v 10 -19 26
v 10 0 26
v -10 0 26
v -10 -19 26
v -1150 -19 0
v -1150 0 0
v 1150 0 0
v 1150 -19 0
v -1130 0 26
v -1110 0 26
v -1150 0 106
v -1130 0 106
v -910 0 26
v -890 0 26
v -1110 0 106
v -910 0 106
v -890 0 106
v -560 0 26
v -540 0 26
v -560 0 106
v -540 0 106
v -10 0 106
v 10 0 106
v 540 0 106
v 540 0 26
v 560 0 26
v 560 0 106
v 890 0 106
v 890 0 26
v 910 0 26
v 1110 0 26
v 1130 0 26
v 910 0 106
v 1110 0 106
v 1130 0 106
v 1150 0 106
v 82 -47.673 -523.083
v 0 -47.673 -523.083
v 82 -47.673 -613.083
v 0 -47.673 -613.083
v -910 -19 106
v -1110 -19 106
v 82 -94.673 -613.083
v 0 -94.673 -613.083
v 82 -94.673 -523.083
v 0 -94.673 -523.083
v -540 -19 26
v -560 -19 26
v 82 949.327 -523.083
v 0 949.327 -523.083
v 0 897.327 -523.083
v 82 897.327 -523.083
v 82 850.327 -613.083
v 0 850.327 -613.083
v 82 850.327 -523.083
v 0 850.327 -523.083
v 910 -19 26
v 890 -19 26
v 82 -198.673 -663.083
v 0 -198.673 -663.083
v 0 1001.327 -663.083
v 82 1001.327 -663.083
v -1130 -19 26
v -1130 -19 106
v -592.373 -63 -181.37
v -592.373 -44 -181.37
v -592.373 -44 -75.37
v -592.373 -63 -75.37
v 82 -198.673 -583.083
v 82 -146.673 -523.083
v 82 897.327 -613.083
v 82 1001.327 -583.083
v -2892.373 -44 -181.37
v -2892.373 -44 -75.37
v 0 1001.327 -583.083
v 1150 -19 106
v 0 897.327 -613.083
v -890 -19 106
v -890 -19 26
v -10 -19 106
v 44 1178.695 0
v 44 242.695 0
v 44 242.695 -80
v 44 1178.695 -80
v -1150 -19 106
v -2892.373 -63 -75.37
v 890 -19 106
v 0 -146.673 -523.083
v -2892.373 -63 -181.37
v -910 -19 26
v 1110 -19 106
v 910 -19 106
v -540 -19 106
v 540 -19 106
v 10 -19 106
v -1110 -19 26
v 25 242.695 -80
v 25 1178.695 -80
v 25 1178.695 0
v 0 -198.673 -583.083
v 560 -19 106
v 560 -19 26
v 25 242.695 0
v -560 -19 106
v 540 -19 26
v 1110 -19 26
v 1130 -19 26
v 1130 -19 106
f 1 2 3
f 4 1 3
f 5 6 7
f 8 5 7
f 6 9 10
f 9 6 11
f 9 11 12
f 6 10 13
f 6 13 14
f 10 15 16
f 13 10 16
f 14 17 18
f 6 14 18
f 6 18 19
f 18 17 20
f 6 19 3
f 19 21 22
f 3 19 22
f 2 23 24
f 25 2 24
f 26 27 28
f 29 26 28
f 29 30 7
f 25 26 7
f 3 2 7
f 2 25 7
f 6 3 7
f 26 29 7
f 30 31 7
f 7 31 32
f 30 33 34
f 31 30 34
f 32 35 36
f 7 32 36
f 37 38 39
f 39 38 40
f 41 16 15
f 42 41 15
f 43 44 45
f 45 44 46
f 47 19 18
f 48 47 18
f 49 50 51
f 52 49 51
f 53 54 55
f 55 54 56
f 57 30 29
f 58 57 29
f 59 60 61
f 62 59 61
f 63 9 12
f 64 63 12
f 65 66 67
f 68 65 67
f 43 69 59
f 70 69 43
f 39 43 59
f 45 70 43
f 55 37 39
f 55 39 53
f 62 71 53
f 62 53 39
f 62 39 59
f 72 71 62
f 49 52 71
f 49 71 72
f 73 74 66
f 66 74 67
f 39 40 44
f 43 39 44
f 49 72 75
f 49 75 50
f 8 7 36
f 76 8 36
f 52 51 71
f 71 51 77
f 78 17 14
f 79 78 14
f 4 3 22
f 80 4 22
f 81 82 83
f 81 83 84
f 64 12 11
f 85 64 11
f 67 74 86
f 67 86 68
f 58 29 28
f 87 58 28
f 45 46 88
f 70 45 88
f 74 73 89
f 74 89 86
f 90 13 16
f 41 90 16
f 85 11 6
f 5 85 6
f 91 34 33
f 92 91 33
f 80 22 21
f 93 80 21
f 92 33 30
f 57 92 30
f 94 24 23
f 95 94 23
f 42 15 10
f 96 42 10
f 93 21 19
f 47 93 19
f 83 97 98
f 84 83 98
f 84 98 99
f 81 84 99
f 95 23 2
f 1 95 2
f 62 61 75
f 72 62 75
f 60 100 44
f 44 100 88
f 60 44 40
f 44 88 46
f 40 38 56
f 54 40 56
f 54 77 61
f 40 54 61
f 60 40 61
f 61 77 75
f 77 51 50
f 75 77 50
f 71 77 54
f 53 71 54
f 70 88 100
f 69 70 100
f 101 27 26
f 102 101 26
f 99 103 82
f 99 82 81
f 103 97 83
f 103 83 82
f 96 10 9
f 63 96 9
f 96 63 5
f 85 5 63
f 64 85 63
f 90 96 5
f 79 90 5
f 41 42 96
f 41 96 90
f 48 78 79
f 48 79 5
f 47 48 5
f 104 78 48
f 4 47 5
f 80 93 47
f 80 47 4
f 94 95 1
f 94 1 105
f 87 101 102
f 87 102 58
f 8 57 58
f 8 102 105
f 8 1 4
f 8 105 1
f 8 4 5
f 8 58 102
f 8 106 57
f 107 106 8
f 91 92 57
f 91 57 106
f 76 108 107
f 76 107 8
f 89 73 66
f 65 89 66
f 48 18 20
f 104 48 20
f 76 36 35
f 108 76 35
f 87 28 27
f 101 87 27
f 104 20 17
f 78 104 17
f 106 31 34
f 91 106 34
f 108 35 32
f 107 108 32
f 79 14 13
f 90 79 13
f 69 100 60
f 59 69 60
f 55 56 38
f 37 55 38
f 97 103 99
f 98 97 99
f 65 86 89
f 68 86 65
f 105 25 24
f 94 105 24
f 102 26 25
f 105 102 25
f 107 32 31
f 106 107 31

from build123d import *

# Parameters (mm, degrees)
F1_DEPTH = 19
F3_W     = 2300
F3_H     = 106
F4_DEPTH = 19
F6_DEPTH = 82
F8_W     = 936
F8_H     = 80
F9_DEPTH = 19


with BuildPart() as f1:
    # F0 (on Front) → F1 (new body)
    with BuildSketch(Plane.XZ):
        Polygon((-1150, 0), (0, 0), (1150, 0), (1150, 106), (1130, 106), (1130, 26), (1110, 26), (1110, 106), (910, 106), (910, 26), (890, 26), (890, 106), (560, 106), (560, 26), (540, 26), (540, 106), (10, 106), (10, 26), (0, 26), (-10, 26), (-10, 106), (-540, 106), (-540, 26), (-560, 26), (-560, 106), (-890, 106), (-890, 26), (-910, 26), (-910, 106), (-1110, 106), (-1110, 26), (-1130, 26), (-1130, 106), (-1150, 106), align=None)
    extrude(amount=F1_DEPTH)


with BuildPart() as f4:
    # F3 (on offset) → F4 (new body)
    with BuildSketch(Plane.XZ.offset(44)):
        with Locations((-1742.3728346825, -128.3702881336)):
            Rectangle(F3_W, F3_H)
    extrude(amount=F4_DEPTH)


with BuildPart() as f6:
    # F5 (on Right) → F6 (new body)
    with BuildSketch(Plane.YZ):
        Polygon((-94.6733198166, -523.0825400352), (-146.6733198166, -523.0825400352), (-198.6733198166, -583.0825400352), (-198.6733198166, -663.0825400352), (1001.3266801834, -663.0825400352), (1001.3266801834, -583.0825400352), (949.3266801834, -523.0825400352), (897.3266801834, -523.0825400352), (897.3266801834, -613.0825400352), (850.3266801834, -613.0825400352), (850.3266801834, -523.0825400352), (-47.6733198166, -523.0825400352), (-47.6733198166, -613.0825400352), (-94.6733198166, -613.0825400352), align=None)
    extrude(amount=F6_DEPTH)


with BuildPart() as f9:
    # F8 (on offset) → F9 (new body)
    with BuildSketch(Plane.YZ.offset(25)):
        with Locations((710.6946312189, -40)):
            Rectangle(F8_W, F8_H)
    extrude(amount=F9_DEPTH)


solid = Compound([f1.part, f4.part, f6.part, f9.part])
